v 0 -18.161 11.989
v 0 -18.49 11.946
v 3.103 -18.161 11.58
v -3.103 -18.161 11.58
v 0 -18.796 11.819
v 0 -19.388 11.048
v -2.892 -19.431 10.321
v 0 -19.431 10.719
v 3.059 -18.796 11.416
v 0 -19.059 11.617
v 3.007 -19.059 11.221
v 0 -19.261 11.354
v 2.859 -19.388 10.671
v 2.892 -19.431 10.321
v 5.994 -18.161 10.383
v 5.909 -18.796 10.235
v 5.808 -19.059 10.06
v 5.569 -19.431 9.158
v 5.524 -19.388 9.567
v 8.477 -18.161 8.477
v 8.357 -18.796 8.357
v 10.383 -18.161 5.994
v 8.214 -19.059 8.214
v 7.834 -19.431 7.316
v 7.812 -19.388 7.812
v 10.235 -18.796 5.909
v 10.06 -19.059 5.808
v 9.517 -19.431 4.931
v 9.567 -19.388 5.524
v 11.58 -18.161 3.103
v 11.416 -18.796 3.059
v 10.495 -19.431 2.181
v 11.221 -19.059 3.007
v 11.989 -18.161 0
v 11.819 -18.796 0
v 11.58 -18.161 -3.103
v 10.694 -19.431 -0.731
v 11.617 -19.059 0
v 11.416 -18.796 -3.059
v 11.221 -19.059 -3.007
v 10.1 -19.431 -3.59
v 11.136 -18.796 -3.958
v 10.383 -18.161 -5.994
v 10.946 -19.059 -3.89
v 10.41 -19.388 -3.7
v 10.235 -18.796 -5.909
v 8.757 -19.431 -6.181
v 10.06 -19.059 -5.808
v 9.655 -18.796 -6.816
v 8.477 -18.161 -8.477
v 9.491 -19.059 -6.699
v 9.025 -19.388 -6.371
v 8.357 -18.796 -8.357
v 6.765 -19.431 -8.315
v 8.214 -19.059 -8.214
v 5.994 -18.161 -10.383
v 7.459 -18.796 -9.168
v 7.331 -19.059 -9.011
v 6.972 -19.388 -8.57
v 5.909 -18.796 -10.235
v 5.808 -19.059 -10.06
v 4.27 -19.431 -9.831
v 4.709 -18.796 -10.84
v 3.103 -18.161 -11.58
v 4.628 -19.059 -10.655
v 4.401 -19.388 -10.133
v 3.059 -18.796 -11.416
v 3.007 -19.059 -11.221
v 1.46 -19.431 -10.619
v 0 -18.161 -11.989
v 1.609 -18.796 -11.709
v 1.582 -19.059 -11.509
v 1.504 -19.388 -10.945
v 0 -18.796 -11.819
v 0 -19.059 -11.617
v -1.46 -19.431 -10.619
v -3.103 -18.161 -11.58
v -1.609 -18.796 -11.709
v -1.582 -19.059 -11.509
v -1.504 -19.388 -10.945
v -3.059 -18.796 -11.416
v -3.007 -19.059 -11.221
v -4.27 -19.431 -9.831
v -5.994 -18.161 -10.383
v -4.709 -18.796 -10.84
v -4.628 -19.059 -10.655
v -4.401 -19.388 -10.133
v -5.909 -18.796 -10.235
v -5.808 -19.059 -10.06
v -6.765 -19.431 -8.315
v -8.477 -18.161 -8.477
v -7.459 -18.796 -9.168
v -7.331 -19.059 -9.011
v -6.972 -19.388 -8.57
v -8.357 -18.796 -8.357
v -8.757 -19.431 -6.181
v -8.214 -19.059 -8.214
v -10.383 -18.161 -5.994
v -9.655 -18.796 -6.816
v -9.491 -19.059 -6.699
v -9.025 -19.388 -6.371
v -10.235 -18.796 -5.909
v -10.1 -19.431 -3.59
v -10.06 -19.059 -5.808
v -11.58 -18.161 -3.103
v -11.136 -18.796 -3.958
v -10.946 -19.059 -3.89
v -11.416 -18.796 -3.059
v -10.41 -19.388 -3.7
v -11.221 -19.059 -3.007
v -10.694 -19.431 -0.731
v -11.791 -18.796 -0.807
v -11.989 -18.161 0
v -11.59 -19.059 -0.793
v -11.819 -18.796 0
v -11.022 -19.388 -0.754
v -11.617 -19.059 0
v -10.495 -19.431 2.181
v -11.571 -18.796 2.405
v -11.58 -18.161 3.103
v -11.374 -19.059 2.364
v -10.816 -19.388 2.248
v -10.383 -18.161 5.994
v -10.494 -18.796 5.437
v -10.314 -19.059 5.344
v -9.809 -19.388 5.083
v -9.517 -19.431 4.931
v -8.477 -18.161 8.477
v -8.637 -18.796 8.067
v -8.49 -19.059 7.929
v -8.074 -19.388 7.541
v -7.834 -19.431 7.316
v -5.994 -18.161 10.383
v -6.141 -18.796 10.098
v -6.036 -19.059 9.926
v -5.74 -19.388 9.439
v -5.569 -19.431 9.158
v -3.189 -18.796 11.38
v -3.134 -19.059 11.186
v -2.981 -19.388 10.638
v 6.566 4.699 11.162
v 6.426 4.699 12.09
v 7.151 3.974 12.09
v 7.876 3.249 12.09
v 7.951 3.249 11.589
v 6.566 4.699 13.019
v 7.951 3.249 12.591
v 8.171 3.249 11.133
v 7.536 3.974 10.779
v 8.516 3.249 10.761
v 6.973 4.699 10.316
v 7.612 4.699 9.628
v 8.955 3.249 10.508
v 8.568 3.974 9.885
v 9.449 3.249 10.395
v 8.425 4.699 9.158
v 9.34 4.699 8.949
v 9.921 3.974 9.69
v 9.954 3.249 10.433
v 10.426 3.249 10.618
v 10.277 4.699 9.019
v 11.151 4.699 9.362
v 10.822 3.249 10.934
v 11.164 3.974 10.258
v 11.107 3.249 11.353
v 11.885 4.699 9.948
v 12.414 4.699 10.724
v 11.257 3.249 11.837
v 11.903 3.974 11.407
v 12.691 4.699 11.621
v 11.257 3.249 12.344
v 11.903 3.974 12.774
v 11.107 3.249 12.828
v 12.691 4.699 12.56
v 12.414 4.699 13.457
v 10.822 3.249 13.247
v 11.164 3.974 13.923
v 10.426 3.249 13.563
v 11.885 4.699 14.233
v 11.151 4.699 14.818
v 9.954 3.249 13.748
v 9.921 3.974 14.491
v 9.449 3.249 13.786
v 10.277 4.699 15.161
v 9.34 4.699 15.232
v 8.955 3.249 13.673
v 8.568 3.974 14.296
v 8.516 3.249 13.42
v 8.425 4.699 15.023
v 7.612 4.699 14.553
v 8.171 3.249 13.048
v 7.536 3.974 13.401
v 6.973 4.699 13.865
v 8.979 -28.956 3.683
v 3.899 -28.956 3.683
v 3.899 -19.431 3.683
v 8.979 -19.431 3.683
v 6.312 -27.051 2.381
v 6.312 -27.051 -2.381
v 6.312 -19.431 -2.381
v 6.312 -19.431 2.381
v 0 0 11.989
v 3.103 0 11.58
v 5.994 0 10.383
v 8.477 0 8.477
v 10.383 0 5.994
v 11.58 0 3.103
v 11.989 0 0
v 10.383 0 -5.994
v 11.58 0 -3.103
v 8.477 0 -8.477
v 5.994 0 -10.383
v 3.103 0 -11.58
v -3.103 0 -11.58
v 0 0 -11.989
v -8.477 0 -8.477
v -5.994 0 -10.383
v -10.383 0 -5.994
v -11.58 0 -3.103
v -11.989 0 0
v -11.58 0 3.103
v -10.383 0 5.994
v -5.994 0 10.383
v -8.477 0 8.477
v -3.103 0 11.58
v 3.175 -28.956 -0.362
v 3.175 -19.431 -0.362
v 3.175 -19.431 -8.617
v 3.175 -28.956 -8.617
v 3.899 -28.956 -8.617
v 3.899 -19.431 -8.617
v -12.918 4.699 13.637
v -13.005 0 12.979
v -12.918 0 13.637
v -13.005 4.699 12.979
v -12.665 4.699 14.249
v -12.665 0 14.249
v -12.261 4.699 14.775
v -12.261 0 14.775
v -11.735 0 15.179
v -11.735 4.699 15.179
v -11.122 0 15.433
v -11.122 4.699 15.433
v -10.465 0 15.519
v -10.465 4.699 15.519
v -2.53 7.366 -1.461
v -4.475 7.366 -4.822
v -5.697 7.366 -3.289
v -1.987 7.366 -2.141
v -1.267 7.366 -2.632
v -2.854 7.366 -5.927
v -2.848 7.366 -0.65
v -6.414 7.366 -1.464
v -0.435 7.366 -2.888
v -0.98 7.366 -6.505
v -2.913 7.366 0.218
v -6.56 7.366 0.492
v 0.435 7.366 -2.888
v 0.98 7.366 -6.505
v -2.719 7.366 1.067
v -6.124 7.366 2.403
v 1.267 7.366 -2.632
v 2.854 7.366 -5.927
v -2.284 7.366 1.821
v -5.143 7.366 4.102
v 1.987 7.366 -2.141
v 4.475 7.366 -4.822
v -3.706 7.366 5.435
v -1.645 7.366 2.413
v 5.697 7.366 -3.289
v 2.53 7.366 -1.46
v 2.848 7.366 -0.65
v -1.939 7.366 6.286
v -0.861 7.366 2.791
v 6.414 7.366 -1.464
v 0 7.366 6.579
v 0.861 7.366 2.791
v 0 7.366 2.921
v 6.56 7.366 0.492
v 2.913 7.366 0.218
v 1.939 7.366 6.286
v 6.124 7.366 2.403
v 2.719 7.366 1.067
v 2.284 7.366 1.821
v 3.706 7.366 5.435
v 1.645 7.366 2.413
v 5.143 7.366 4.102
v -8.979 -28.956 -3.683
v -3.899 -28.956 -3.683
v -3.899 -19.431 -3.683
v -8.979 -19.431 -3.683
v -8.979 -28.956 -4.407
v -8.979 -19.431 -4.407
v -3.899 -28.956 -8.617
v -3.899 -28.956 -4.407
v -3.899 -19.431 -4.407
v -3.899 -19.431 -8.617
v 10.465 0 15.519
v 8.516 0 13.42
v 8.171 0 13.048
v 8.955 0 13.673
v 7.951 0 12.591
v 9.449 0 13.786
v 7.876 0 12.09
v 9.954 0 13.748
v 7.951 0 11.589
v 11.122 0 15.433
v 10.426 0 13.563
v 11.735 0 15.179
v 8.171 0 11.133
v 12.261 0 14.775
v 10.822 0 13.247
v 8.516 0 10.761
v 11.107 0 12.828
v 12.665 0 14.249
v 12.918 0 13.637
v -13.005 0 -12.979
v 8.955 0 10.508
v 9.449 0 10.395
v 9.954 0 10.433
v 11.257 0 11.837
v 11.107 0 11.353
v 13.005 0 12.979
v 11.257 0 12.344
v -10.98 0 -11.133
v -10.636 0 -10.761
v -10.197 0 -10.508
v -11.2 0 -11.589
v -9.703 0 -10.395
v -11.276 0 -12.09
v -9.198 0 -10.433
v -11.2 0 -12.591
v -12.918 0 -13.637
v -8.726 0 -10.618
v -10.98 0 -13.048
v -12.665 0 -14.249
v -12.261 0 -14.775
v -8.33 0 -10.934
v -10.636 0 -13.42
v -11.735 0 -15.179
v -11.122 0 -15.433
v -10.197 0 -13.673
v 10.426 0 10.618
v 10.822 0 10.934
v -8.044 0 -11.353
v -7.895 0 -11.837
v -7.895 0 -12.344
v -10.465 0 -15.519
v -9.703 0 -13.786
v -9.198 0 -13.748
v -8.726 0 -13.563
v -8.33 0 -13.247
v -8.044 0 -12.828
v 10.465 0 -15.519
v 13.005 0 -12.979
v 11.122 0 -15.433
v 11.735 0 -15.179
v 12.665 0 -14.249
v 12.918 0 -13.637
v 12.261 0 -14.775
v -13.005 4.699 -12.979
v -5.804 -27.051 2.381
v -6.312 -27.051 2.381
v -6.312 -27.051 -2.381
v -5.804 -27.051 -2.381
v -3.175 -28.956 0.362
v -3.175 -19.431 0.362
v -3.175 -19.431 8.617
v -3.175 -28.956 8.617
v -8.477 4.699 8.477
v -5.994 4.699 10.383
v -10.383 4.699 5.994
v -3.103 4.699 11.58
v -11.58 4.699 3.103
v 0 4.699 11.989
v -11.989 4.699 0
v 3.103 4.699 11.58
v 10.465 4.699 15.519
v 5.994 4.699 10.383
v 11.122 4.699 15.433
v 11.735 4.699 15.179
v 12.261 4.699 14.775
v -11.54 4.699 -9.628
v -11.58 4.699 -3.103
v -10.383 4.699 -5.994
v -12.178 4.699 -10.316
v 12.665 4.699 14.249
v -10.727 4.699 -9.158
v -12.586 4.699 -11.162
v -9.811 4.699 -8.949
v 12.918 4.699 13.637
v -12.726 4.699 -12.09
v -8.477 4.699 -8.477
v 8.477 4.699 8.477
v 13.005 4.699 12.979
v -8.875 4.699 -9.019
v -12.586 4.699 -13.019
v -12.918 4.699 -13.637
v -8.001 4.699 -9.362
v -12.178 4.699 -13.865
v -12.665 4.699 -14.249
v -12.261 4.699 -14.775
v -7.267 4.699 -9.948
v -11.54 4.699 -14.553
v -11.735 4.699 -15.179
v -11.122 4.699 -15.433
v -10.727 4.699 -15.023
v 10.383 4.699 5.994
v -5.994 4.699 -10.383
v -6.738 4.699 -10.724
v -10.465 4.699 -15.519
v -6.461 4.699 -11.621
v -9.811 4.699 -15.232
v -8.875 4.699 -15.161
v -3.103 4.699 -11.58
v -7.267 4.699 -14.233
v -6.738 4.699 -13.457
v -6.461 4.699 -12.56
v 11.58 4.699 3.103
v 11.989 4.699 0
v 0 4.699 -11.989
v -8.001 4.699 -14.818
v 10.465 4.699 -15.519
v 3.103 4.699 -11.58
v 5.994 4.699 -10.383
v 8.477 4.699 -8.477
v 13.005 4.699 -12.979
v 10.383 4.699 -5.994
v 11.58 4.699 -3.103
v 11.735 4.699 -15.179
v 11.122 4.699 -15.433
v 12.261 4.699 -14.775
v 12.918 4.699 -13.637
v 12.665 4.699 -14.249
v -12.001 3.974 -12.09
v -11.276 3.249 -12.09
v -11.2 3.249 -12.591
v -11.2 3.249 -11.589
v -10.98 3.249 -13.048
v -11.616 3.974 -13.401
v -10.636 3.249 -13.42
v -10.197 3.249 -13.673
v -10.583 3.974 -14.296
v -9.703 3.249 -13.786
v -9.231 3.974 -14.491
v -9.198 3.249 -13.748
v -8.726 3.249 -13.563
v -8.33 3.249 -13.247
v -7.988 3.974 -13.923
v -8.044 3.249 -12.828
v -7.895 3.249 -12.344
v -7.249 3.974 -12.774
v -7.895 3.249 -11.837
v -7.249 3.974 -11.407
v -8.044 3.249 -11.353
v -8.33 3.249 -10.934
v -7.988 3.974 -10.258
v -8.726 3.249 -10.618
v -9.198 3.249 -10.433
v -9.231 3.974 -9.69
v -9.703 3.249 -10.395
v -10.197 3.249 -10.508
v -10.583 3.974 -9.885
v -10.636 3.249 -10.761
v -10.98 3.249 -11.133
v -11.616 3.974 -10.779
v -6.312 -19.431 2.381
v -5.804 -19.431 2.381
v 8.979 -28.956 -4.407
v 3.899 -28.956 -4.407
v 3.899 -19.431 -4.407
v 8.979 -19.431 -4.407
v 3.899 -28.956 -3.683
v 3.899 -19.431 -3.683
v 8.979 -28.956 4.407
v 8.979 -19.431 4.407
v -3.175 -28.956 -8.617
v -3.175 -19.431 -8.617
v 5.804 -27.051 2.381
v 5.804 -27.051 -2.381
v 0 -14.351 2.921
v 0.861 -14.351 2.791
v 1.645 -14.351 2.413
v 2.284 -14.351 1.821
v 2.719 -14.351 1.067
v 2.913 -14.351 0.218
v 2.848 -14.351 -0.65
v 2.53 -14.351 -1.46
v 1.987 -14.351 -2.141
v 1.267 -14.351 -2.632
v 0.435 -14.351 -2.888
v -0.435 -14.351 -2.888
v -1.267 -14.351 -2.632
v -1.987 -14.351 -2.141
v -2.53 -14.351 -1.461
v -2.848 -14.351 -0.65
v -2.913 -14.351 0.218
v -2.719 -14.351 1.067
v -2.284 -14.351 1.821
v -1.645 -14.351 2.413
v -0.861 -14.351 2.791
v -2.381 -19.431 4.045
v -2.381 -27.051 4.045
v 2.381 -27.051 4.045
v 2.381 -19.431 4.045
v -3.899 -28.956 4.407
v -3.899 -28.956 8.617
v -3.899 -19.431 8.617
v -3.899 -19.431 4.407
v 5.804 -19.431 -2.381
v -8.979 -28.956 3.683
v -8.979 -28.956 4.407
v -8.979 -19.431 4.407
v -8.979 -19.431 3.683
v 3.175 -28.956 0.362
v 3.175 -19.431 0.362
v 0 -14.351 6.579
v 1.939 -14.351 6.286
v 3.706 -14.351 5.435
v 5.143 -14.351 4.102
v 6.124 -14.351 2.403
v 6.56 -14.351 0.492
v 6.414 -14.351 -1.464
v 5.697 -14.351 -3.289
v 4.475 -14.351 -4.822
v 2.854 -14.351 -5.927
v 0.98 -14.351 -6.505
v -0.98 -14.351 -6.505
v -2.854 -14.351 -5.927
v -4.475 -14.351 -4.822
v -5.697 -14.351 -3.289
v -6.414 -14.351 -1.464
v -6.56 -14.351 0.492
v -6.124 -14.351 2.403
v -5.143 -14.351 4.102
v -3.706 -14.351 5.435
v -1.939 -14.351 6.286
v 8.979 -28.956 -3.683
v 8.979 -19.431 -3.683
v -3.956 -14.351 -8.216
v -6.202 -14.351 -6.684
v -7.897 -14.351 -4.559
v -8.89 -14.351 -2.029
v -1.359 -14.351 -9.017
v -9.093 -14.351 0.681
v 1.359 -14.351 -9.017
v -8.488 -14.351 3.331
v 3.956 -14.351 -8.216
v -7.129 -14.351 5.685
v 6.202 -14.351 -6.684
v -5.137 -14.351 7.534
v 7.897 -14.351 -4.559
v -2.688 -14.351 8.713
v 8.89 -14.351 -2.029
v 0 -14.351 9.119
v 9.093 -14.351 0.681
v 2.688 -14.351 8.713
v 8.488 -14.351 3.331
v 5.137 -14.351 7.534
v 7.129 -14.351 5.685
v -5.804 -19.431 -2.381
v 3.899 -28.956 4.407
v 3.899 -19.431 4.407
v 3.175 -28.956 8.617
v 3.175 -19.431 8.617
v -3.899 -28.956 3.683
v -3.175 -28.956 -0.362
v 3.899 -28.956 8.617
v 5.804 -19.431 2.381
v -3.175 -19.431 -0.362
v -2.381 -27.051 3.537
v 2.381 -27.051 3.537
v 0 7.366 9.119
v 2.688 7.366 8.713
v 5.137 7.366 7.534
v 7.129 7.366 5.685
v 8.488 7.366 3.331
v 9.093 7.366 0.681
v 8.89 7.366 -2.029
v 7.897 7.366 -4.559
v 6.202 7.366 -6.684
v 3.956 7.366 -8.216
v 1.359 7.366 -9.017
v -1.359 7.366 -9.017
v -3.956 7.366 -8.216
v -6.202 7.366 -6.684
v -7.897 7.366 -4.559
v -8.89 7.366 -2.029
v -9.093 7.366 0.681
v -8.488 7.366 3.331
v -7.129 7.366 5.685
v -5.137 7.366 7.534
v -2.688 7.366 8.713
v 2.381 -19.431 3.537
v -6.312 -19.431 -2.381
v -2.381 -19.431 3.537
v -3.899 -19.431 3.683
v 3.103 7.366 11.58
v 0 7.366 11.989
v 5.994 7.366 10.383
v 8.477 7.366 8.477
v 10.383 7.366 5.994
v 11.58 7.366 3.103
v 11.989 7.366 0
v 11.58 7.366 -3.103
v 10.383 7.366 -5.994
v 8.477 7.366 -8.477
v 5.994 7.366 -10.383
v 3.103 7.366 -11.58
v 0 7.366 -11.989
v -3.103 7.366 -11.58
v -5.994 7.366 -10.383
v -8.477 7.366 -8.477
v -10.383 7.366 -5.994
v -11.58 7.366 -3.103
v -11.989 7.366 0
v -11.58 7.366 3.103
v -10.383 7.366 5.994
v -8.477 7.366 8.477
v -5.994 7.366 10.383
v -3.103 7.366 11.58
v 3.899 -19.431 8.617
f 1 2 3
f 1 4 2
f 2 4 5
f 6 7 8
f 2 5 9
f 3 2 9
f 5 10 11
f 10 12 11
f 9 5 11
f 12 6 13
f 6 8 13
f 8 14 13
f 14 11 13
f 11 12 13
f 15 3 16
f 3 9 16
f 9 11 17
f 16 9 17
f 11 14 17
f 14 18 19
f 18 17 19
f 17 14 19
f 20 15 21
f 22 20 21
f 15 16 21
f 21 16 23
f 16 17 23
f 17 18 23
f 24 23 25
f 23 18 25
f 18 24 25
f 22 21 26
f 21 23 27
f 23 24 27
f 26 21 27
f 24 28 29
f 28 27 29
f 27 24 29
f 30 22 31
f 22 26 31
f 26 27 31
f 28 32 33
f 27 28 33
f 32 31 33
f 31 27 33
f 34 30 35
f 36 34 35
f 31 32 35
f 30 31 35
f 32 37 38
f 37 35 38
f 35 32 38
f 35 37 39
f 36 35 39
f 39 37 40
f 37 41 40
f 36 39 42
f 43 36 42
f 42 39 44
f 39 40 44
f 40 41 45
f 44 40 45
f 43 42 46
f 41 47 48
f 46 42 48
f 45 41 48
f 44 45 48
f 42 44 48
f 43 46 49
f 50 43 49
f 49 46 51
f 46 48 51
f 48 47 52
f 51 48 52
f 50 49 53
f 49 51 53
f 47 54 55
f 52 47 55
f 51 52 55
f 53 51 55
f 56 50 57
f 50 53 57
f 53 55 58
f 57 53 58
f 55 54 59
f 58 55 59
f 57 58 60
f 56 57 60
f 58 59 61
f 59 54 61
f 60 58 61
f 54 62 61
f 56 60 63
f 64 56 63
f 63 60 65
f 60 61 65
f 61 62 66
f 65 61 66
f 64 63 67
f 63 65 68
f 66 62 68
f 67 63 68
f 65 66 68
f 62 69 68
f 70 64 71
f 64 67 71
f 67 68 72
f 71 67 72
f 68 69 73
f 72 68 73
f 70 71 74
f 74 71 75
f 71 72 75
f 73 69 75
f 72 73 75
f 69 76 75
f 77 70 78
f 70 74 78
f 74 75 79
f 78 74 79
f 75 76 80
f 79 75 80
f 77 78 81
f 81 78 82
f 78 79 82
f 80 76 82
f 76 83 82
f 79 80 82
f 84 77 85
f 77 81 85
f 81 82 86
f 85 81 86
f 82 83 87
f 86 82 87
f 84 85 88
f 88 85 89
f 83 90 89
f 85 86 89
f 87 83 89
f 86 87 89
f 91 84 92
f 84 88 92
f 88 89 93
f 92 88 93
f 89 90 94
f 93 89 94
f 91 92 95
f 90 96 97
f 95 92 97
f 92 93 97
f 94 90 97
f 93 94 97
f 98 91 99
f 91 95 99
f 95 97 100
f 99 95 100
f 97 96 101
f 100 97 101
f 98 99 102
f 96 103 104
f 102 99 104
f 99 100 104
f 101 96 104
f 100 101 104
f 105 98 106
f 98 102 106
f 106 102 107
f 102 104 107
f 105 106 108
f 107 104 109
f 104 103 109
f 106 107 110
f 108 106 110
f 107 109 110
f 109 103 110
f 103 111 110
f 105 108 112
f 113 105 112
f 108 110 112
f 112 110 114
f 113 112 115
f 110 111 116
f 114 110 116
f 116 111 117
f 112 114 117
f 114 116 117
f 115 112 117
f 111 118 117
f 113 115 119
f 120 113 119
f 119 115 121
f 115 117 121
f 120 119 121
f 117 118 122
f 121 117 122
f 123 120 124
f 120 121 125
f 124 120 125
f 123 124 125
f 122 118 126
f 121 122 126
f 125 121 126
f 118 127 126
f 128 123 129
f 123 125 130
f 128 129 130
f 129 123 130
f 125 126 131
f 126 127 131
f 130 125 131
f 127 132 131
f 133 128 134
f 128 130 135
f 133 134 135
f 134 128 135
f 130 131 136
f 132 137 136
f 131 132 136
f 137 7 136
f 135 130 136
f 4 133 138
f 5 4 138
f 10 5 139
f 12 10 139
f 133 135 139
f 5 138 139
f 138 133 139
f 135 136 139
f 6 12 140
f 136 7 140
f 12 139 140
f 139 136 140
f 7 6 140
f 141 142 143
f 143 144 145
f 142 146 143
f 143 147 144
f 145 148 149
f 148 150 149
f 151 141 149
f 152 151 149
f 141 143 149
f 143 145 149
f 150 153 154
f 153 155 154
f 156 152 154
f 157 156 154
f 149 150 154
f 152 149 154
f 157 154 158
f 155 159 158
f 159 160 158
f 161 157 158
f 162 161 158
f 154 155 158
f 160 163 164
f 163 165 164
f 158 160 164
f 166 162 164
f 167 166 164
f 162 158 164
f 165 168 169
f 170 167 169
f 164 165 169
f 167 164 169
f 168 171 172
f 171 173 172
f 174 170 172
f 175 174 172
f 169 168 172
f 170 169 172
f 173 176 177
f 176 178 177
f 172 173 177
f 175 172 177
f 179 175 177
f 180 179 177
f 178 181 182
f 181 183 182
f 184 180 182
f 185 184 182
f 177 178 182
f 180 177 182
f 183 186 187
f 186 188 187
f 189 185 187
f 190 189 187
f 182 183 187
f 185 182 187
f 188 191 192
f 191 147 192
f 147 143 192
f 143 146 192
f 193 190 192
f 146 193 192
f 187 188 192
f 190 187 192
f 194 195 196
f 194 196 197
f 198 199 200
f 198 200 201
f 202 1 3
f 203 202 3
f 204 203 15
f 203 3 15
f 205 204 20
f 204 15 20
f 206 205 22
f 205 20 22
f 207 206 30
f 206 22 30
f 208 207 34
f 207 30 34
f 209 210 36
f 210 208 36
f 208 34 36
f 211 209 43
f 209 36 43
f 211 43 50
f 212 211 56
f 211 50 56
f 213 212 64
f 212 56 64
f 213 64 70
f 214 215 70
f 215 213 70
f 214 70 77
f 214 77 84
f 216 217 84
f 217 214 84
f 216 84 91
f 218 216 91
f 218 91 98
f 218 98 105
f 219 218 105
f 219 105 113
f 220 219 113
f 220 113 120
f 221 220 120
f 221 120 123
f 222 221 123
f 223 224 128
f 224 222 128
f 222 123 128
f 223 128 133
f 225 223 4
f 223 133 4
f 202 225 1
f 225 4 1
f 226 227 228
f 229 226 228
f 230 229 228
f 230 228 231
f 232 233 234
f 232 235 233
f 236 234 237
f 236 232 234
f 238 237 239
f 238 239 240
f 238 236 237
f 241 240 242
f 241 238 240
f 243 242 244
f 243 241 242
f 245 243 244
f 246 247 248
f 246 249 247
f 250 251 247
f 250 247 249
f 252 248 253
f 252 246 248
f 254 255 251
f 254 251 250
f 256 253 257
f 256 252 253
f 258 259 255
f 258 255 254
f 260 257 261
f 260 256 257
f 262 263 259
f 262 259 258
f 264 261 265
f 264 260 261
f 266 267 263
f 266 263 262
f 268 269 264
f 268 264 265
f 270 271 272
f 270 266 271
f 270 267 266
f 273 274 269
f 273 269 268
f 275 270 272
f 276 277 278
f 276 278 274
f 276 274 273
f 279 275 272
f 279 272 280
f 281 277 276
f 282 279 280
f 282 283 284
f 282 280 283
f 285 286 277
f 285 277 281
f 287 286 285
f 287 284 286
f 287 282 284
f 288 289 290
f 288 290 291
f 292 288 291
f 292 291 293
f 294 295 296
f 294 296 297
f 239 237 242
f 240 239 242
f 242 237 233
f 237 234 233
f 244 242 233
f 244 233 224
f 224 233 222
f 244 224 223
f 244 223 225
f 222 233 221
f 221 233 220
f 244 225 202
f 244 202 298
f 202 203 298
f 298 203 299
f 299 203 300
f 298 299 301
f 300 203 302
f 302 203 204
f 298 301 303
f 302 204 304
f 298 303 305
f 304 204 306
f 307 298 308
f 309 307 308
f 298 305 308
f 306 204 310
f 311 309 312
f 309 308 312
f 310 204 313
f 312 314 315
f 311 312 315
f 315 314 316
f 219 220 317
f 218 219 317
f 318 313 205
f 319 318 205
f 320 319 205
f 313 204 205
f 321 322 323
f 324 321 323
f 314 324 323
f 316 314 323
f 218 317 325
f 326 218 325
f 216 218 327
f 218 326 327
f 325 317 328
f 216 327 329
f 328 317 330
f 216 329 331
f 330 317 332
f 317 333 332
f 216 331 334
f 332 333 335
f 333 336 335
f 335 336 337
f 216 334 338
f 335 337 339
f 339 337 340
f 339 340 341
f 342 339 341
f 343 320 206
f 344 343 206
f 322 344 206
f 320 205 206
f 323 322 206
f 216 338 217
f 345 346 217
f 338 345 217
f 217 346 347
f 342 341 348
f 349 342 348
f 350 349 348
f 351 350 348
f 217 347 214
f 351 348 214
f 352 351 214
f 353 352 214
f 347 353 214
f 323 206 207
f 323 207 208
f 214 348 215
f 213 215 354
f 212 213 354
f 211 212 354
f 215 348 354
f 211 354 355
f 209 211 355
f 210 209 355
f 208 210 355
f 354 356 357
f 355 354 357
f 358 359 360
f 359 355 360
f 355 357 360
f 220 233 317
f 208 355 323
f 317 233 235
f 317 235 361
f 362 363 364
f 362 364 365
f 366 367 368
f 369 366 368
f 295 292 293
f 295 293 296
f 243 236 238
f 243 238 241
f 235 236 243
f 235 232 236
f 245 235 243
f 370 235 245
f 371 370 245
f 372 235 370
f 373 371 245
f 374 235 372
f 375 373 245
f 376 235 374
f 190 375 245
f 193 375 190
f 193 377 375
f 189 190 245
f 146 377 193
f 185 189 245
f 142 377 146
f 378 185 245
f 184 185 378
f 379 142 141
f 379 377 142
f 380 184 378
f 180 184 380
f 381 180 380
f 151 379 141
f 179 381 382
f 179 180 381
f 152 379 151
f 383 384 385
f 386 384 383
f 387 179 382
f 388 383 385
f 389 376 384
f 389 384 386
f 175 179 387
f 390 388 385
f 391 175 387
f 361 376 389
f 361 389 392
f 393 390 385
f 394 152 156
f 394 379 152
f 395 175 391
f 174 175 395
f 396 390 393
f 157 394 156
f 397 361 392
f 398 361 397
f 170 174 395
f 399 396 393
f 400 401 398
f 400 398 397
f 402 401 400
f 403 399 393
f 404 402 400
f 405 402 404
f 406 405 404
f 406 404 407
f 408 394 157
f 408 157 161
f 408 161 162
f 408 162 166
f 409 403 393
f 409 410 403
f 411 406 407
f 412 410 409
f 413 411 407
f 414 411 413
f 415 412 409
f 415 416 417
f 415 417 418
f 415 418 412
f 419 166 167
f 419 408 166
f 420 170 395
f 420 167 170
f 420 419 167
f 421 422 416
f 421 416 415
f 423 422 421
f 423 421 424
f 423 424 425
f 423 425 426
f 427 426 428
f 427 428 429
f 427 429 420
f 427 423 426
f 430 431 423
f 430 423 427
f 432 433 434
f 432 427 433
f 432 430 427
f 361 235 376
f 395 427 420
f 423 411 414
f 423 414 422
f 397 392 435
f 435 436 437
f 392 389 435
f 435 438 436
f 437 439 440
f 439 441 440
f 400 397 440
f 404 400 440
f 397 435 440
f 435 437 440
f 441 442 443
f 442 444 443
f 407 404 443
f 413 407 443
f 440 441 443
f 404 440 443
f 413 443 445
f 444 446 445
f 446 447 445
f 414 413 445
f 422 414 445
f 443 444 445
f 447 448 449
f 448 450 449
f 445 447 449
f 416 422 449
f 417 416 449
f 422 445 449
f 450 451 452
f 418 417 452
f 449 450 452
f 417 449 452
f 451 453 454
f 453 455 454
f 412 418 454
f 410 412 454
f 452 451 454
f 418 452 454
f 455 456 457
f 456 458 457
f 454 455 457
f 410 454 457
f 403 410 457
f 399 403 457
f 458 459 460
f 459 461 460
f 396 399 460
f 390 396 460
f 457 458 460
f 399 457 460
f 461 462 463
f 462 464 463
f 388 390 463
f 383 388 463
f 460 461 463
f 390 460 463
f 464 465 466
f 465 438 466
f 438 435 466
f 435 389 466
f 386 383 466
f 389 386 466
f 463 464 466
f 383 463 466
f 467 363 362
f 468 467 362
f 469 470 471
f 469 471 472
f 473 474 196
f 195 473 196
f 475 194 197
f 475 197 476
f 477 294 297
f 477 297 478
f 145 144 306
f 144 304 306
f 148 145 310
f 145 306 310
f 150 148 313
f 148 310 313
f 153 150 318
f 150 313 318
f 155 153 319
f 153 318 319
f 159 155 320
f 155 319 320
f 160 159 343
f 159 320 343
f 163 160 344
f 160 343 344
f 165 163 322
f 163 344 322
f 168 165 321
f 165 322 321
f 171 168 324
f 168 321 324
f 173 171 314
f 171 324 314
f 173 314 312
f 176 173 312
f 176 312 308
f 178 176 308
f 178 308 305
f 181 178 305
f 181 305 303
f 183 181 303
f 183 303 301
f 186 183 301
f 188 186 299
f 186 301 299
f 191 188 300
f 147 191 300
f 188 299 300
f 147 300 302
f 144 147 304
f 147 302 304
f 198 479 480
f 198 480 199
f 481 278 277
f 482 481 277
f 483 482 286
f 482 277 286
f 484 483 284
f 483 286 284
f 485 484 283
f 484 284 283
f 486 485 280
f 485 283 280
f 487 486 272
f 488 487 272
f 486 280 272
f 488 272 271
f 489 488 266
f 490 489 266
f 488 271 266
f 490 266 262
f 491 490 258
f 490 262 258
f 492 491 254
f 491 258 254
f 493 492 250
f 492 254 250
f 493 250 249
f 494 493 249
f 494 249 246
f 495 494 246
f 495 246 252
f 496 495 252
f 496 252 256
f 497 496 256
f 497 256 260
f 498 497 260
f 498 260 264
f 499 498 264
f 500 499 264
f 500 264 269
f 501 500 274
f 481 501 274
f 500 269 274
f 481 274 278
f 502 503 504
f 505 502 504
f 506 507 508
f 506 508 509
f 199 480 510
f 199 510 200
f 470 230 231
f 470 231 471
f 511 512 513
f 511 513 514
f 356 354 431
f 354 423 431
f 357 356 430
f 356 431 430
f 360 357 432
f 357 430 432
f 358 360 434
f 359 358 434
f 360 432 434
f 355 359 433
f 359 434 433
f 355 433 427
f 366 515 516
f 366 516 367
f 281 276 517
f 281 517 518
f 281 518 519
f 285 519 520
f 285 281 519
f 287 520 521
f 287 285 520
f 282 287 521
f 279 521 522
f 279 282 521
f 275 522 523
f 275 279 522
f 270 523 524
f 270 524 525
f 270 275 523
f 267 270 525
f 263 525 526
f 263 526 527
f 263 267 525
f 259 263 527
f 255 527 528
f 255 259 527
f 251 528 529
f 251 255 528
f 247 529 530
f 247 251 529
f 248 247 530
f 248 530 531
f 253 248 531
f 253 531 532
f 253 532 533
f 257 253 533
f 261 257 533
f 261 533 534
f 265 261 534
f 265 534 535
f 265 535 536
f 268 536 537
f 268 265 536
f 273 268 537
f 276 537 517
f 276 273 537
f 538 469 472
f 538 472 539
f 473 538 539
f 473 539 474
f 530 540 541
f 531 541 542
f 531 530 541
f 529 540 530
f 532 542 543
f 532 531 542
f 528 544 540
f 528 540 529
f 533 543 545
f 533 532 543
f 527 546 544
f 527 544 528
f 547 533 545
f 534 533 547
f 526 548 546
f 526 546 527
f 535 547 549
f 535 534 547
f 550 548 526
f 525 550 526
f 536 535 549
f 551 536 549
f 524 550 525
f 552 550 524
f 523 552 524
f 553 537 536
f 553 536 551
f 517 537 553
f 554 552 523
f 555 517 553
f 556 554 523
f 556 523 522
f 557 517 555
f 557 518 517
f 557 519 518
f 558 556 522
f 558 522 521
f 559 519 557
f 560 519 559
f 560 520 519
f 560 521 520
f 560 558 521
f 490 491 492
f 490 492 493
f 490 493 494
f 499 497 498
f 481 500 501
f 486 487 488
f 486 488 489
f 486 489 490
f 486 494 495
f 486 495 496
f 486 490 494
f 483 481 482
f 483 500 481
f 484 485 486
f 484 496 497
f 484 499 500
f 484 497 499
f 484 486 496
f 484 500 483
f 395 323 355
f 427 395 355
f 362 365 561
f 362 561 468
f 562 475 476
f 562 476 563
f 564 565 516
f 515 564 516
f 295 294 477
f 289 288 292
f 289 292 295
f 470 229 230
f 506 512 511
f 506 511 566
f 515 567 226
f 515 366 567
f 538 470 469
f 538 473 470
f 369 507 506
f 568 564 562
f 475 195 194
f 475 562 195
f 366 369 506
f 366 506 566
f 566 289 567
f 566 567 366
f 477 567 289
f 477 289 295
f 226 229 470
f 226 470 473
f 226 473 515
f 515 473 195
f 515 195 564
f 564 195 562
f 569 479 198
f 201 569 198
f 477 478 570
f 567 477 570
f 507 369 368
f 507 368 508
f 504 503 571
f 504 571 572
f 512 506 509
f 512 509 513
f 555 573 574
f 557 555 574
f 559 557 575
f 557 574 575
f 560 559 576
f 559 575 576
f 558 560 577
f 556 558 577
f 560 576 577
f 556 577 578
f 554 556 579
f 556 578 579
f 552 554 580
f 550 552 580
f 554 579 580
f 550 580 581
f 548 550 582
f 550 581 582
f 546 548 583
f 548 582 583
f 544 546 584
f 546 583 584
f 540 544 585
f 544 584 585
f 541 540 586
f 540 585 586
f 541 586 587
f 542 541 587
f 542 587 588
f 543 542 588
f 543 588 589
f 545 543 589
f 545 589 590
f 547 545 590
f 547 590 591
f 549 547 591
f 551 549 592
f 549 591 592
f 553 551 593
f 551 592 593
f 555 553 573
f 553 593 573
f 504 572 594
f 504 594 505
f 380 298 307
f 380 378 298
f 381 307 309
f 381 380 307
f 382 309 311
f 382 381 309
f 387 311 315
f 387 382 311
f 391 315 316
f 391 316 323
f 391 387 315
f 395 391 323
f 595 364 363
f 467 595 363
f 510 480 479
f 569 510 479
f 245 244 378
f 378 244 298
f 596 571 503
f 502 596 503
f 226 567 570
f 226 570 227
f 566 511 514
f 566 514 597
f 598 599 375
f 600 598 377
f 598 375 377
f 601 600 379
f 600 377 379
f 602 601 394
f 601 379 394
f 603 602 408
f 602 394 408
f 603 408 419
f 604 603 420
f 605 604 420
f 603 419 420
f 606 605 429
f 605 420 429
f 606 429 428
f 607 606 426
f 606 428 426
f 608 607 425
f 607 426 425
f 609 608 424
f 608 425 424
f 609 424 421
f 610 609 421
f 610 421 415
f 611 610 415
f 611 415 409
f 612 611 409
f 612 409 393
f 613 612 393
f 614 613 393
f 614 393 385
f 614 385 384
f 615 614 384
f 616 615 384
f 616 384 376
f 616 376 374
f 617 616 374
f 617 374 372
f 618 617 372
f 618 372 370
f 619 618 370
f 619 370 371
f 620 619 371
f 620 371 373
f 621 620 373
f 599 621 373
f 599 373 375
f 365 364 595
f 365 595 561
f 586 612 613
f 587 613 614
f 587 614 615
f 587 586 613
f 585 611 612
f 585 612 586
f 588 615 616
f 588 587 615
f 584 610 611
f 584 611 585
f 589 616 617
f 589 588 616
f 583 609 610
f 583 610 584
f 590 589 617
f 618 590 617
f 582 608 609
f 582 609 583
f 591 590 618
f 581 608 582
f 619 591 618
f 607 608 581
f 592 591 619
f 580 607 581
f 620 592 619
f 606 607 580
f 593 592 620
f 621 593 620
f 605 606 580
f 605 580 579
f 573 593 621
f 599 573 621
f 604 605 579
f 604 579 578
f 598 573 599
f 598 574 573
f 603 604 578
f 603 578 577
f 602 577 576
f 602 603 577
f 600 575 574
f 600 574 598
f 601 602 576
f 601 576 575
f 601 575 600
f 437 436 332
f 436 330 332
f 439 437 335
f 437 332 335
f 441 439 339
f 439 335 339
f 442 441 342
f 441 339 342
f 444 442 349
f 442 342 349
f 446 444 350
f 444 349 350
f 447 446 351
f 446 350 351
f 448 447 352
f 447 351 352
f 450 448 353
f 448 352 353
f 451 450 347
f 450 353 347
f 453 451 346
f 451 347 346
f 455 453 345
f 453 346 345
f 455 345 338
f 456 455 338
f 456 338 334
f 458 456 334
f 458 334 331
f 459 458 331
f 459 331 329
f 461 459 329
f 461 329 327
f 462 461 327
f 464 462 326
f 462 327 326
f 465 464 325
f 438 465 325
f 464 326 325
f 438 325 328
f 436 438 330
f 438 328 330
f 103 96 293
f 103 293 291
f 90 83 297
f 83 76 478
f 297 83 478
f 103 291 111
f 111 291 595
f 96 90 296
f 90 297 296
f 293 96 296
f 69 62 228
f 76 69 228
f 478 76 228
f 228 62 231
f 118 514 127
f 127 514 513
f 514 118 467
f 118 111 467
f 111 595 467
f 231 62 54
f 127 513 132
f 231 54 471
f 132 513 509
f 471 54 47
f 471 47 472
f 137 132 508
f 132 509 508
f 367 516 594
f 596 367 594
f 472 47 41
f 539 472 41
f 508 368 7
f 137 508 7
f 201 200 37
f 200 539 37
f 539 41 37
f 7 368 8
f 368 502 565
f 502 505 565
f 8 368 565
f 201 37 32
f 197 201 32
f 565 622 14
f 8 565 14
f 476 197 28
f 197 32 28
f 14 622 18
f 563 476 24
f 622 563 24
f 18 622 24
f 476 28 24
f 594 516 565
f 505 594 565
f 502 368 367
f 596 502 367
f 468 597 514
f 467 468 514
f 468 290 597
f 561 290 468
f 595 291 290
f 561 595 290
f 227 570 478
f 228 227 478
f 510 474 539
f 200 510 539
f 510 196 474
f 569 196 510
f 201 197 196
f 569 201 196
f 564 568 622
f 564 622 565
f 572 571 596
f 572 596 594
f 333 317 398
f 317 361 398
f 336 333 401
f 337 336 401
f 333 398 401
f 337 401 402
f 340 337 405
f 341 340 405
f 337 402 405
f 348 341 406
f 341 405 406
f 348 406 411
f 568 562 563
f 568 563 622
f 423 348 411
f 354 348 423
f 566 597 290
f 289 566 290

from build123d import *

# Parameters (mm, degrees)
BOSS_EXTRUDE1_DEPTH                             = 7.366
BOSS_EXTRUDE1_DEPTH_BACK                        = 19.431
SKETCH1_R                                       = 11.9888
SKETCH3_W                                       = 26.0096
SKETCH3_H                                       = 31.0388
BOSS_EXTRUDE3_DEPTH                             = 4.699
CSK_FOR_M3_FLAT_HEAD_MACHINE_SCREW2_D           = 3.4
CSK_FOR_M3_FLAT_HEAD_MACHINE_SCREW2_CSINK_D     = 6.3
CSK_FOR_M3_FLAT_HEAD_MACHINE_SCREW2_CSINK_ANGLE = 90
SKETCH11_R                                      = 9.1186
SKETCH11_R_2                                    = 6.5786
CUT_EXTRUDE1_DEPTH                              = 21.717
FILLET1_R                                       = 2.54
SKETCH12_R                                      = 2.921
CUT_EXTRUDE3_DEPTH                              = 21.717
BOSS_EXTRUDE4_DEPTH                             = 9.525
SKETCH14_W                                      = 4.7625
SKETCH14_H                                      = 0.508
SKETCH14_W_2                                    = 0.508
SKETCH14_H_2                                    = 4.7625
BOSS_EXTRUDE5_DEPTH                             = 7.62
FILLET2_R                                       = 1.27


with BuildPart() as part:
    # Sketch1 → Boss-Extrude1 (new, two sides: drawn at the far end of the back side and taken through both)
    with BuildSketch(Plane(origin=(0, 0, 0), x_dir=(1, 0, 0), z_dir=(0, 1, 0)).offset(-BOSS_EXTRUDE1_DEPTH_BACK)):
        with Locations(Location((0, 0, 0), (0, 0, 270))):
            Circle(SKETCH1_R)
    extrude(amount=BOSS_EXTRUDE1_DEPTH + BOSS_EXTRUDE1_DEPTH_BACK)

    # Sketch3 → Boss-Extrude3 (add)
    with BuildSketch(Plane(origin=(0, 0, 0), x_dir=(1, 0, 0), z_dir=(0, 1, 0))):
        Rectangle(SKETCH3_W, SKETCH3_H)
    extrude(amount=BOSS_EXTRUDE3_DEPTH)

    # CSK for M3 Flat Head Machine Screw2 (through all)
    with Locations(Plane(origin=(0, 4.699, 0), x_dir=(1, 0, 0), z_dir=(0, 1, 0))):
        with Locations((-9.5758, 12.0904), (9.5758, -12.0904)):
            CounterSinkHole(CSK_FOR_M3_FLAT_HEAD_MACHINE_SCREW2_D / 2, CSK_FOR_M3_FLAT_HEAD_MACHINE_SCREW2_CSINK_D / 2, counter_sink_angle=CSK_FOR_M3_FLAT_HEAD_MACHINE_SCREW2_CSINK_ANGLE)

    # Sketch11 → Cut-Extrude1 (cut)
    with BuildSketch(Plane(origin=(0, 7.366, 0), x_dir=(1, 0, 0), z_dir=(0, 1, 0))):
        with Locations(Location((0, 0, 0), (0, 0, 270))):
            Circle(SKETCH11_R)
        with Locations(Location((0, 0, 0), (0, 0, 270))):
            Circle(SKETCH11_R_2, mode=Mode.SUBTRACT)
    extrude(amount=-CUT_EXTRUDE1_DEPTH, mode=Mode.SUBTRACT)

    # Fillet1
    fillet1_edges = [part.edges().sort_by_distance(p)[0] for p in [
        (13.0048, 2.3495, -15.5194),
        (-13.0048, 2.3495, -15.5194),
        (-13.0048, 2.3495, 15.5194),
        (13.0048, 2.3495, 15.5194),
    ]]
    fillet(fillet1_edges, radius=FILLET1_R)

    # Sketch12 → Cut-Extrude3 (cut)
    with BuildSketch(Plane(origin=(0, 7.366, 0), x_dir=(1, 0, 0), z_dir=(0, 1, 0))):
        with Locations(Location((0, 0, 0), (0, 0, 270))):
            Circle(SKETCH12_R)
    extrude(amount=-CUT_EXTRUDE3_DEPTH, mode=Mode.SUBTRACT)

    # Sketch13 → Boss-Extrude4 (add)
    with BuildSketch(Plane.XZ.offset(19.431)):
        Polygon((3.175, 0.36195), (-3.175, 0.36195), (-3.175, 8.61695), (-3.8989, 8.61695), (-3.8989, 4.4069), (-8.9789, 4.4069), (-8.9789, 3.683), (-3.8989, 3.683), (-3.8989, -3.683), (-8.9789, -3.683), (-8.9789, -4.4069), (-3.8989, -4.4069), (-3.8989, -8.61695), (-3.175, -8.61695), (-3.175, -0.36195), (3.175, -0.36195), (3.175, -8.61695), (3.8989, -8.61695), (3.8989, -4.4069), (8.9789, -4.4069), (8.9789, -3.683), (3.8989, -3.683), (3.8989, 3.683), (8.9789, 3.683), (8.9789, 4.4069), (3.8989, 4.4069), (3.8989, 8.61695), (3.175, 8.61695), align=None)
    extrude(amount=BOSS_EXTRUDE4_DEPTH)

    # Sketch14 → Boss-Extrude5 (add)
    with BuildSketch(Plane.XZ.offset(19.431)):
        with Locations((0, 3.79095)):
            Rectangle(SKETCH14_W, SKETCH14_H)
        with Locations((-6.0579, 0)):
            Rectangle(SKETCH14_W_2, SKETCH14_H_2)
        with Locations((6.0579, 0)):
            Rectangle(SKETCH14_W_2, SKETCH14_H_2)
    extrude(amount=BOSS_EXTRUDE5_DEPTH)

    # Fillet2
    fillet2_edges = [part.edges().sort_by_distance(p)[0] for p in [
        (0, -19.431, -11.9888),
    ]]
    fillet(fillet2_edges, radius=FILLET2_R)


solid = part.part
